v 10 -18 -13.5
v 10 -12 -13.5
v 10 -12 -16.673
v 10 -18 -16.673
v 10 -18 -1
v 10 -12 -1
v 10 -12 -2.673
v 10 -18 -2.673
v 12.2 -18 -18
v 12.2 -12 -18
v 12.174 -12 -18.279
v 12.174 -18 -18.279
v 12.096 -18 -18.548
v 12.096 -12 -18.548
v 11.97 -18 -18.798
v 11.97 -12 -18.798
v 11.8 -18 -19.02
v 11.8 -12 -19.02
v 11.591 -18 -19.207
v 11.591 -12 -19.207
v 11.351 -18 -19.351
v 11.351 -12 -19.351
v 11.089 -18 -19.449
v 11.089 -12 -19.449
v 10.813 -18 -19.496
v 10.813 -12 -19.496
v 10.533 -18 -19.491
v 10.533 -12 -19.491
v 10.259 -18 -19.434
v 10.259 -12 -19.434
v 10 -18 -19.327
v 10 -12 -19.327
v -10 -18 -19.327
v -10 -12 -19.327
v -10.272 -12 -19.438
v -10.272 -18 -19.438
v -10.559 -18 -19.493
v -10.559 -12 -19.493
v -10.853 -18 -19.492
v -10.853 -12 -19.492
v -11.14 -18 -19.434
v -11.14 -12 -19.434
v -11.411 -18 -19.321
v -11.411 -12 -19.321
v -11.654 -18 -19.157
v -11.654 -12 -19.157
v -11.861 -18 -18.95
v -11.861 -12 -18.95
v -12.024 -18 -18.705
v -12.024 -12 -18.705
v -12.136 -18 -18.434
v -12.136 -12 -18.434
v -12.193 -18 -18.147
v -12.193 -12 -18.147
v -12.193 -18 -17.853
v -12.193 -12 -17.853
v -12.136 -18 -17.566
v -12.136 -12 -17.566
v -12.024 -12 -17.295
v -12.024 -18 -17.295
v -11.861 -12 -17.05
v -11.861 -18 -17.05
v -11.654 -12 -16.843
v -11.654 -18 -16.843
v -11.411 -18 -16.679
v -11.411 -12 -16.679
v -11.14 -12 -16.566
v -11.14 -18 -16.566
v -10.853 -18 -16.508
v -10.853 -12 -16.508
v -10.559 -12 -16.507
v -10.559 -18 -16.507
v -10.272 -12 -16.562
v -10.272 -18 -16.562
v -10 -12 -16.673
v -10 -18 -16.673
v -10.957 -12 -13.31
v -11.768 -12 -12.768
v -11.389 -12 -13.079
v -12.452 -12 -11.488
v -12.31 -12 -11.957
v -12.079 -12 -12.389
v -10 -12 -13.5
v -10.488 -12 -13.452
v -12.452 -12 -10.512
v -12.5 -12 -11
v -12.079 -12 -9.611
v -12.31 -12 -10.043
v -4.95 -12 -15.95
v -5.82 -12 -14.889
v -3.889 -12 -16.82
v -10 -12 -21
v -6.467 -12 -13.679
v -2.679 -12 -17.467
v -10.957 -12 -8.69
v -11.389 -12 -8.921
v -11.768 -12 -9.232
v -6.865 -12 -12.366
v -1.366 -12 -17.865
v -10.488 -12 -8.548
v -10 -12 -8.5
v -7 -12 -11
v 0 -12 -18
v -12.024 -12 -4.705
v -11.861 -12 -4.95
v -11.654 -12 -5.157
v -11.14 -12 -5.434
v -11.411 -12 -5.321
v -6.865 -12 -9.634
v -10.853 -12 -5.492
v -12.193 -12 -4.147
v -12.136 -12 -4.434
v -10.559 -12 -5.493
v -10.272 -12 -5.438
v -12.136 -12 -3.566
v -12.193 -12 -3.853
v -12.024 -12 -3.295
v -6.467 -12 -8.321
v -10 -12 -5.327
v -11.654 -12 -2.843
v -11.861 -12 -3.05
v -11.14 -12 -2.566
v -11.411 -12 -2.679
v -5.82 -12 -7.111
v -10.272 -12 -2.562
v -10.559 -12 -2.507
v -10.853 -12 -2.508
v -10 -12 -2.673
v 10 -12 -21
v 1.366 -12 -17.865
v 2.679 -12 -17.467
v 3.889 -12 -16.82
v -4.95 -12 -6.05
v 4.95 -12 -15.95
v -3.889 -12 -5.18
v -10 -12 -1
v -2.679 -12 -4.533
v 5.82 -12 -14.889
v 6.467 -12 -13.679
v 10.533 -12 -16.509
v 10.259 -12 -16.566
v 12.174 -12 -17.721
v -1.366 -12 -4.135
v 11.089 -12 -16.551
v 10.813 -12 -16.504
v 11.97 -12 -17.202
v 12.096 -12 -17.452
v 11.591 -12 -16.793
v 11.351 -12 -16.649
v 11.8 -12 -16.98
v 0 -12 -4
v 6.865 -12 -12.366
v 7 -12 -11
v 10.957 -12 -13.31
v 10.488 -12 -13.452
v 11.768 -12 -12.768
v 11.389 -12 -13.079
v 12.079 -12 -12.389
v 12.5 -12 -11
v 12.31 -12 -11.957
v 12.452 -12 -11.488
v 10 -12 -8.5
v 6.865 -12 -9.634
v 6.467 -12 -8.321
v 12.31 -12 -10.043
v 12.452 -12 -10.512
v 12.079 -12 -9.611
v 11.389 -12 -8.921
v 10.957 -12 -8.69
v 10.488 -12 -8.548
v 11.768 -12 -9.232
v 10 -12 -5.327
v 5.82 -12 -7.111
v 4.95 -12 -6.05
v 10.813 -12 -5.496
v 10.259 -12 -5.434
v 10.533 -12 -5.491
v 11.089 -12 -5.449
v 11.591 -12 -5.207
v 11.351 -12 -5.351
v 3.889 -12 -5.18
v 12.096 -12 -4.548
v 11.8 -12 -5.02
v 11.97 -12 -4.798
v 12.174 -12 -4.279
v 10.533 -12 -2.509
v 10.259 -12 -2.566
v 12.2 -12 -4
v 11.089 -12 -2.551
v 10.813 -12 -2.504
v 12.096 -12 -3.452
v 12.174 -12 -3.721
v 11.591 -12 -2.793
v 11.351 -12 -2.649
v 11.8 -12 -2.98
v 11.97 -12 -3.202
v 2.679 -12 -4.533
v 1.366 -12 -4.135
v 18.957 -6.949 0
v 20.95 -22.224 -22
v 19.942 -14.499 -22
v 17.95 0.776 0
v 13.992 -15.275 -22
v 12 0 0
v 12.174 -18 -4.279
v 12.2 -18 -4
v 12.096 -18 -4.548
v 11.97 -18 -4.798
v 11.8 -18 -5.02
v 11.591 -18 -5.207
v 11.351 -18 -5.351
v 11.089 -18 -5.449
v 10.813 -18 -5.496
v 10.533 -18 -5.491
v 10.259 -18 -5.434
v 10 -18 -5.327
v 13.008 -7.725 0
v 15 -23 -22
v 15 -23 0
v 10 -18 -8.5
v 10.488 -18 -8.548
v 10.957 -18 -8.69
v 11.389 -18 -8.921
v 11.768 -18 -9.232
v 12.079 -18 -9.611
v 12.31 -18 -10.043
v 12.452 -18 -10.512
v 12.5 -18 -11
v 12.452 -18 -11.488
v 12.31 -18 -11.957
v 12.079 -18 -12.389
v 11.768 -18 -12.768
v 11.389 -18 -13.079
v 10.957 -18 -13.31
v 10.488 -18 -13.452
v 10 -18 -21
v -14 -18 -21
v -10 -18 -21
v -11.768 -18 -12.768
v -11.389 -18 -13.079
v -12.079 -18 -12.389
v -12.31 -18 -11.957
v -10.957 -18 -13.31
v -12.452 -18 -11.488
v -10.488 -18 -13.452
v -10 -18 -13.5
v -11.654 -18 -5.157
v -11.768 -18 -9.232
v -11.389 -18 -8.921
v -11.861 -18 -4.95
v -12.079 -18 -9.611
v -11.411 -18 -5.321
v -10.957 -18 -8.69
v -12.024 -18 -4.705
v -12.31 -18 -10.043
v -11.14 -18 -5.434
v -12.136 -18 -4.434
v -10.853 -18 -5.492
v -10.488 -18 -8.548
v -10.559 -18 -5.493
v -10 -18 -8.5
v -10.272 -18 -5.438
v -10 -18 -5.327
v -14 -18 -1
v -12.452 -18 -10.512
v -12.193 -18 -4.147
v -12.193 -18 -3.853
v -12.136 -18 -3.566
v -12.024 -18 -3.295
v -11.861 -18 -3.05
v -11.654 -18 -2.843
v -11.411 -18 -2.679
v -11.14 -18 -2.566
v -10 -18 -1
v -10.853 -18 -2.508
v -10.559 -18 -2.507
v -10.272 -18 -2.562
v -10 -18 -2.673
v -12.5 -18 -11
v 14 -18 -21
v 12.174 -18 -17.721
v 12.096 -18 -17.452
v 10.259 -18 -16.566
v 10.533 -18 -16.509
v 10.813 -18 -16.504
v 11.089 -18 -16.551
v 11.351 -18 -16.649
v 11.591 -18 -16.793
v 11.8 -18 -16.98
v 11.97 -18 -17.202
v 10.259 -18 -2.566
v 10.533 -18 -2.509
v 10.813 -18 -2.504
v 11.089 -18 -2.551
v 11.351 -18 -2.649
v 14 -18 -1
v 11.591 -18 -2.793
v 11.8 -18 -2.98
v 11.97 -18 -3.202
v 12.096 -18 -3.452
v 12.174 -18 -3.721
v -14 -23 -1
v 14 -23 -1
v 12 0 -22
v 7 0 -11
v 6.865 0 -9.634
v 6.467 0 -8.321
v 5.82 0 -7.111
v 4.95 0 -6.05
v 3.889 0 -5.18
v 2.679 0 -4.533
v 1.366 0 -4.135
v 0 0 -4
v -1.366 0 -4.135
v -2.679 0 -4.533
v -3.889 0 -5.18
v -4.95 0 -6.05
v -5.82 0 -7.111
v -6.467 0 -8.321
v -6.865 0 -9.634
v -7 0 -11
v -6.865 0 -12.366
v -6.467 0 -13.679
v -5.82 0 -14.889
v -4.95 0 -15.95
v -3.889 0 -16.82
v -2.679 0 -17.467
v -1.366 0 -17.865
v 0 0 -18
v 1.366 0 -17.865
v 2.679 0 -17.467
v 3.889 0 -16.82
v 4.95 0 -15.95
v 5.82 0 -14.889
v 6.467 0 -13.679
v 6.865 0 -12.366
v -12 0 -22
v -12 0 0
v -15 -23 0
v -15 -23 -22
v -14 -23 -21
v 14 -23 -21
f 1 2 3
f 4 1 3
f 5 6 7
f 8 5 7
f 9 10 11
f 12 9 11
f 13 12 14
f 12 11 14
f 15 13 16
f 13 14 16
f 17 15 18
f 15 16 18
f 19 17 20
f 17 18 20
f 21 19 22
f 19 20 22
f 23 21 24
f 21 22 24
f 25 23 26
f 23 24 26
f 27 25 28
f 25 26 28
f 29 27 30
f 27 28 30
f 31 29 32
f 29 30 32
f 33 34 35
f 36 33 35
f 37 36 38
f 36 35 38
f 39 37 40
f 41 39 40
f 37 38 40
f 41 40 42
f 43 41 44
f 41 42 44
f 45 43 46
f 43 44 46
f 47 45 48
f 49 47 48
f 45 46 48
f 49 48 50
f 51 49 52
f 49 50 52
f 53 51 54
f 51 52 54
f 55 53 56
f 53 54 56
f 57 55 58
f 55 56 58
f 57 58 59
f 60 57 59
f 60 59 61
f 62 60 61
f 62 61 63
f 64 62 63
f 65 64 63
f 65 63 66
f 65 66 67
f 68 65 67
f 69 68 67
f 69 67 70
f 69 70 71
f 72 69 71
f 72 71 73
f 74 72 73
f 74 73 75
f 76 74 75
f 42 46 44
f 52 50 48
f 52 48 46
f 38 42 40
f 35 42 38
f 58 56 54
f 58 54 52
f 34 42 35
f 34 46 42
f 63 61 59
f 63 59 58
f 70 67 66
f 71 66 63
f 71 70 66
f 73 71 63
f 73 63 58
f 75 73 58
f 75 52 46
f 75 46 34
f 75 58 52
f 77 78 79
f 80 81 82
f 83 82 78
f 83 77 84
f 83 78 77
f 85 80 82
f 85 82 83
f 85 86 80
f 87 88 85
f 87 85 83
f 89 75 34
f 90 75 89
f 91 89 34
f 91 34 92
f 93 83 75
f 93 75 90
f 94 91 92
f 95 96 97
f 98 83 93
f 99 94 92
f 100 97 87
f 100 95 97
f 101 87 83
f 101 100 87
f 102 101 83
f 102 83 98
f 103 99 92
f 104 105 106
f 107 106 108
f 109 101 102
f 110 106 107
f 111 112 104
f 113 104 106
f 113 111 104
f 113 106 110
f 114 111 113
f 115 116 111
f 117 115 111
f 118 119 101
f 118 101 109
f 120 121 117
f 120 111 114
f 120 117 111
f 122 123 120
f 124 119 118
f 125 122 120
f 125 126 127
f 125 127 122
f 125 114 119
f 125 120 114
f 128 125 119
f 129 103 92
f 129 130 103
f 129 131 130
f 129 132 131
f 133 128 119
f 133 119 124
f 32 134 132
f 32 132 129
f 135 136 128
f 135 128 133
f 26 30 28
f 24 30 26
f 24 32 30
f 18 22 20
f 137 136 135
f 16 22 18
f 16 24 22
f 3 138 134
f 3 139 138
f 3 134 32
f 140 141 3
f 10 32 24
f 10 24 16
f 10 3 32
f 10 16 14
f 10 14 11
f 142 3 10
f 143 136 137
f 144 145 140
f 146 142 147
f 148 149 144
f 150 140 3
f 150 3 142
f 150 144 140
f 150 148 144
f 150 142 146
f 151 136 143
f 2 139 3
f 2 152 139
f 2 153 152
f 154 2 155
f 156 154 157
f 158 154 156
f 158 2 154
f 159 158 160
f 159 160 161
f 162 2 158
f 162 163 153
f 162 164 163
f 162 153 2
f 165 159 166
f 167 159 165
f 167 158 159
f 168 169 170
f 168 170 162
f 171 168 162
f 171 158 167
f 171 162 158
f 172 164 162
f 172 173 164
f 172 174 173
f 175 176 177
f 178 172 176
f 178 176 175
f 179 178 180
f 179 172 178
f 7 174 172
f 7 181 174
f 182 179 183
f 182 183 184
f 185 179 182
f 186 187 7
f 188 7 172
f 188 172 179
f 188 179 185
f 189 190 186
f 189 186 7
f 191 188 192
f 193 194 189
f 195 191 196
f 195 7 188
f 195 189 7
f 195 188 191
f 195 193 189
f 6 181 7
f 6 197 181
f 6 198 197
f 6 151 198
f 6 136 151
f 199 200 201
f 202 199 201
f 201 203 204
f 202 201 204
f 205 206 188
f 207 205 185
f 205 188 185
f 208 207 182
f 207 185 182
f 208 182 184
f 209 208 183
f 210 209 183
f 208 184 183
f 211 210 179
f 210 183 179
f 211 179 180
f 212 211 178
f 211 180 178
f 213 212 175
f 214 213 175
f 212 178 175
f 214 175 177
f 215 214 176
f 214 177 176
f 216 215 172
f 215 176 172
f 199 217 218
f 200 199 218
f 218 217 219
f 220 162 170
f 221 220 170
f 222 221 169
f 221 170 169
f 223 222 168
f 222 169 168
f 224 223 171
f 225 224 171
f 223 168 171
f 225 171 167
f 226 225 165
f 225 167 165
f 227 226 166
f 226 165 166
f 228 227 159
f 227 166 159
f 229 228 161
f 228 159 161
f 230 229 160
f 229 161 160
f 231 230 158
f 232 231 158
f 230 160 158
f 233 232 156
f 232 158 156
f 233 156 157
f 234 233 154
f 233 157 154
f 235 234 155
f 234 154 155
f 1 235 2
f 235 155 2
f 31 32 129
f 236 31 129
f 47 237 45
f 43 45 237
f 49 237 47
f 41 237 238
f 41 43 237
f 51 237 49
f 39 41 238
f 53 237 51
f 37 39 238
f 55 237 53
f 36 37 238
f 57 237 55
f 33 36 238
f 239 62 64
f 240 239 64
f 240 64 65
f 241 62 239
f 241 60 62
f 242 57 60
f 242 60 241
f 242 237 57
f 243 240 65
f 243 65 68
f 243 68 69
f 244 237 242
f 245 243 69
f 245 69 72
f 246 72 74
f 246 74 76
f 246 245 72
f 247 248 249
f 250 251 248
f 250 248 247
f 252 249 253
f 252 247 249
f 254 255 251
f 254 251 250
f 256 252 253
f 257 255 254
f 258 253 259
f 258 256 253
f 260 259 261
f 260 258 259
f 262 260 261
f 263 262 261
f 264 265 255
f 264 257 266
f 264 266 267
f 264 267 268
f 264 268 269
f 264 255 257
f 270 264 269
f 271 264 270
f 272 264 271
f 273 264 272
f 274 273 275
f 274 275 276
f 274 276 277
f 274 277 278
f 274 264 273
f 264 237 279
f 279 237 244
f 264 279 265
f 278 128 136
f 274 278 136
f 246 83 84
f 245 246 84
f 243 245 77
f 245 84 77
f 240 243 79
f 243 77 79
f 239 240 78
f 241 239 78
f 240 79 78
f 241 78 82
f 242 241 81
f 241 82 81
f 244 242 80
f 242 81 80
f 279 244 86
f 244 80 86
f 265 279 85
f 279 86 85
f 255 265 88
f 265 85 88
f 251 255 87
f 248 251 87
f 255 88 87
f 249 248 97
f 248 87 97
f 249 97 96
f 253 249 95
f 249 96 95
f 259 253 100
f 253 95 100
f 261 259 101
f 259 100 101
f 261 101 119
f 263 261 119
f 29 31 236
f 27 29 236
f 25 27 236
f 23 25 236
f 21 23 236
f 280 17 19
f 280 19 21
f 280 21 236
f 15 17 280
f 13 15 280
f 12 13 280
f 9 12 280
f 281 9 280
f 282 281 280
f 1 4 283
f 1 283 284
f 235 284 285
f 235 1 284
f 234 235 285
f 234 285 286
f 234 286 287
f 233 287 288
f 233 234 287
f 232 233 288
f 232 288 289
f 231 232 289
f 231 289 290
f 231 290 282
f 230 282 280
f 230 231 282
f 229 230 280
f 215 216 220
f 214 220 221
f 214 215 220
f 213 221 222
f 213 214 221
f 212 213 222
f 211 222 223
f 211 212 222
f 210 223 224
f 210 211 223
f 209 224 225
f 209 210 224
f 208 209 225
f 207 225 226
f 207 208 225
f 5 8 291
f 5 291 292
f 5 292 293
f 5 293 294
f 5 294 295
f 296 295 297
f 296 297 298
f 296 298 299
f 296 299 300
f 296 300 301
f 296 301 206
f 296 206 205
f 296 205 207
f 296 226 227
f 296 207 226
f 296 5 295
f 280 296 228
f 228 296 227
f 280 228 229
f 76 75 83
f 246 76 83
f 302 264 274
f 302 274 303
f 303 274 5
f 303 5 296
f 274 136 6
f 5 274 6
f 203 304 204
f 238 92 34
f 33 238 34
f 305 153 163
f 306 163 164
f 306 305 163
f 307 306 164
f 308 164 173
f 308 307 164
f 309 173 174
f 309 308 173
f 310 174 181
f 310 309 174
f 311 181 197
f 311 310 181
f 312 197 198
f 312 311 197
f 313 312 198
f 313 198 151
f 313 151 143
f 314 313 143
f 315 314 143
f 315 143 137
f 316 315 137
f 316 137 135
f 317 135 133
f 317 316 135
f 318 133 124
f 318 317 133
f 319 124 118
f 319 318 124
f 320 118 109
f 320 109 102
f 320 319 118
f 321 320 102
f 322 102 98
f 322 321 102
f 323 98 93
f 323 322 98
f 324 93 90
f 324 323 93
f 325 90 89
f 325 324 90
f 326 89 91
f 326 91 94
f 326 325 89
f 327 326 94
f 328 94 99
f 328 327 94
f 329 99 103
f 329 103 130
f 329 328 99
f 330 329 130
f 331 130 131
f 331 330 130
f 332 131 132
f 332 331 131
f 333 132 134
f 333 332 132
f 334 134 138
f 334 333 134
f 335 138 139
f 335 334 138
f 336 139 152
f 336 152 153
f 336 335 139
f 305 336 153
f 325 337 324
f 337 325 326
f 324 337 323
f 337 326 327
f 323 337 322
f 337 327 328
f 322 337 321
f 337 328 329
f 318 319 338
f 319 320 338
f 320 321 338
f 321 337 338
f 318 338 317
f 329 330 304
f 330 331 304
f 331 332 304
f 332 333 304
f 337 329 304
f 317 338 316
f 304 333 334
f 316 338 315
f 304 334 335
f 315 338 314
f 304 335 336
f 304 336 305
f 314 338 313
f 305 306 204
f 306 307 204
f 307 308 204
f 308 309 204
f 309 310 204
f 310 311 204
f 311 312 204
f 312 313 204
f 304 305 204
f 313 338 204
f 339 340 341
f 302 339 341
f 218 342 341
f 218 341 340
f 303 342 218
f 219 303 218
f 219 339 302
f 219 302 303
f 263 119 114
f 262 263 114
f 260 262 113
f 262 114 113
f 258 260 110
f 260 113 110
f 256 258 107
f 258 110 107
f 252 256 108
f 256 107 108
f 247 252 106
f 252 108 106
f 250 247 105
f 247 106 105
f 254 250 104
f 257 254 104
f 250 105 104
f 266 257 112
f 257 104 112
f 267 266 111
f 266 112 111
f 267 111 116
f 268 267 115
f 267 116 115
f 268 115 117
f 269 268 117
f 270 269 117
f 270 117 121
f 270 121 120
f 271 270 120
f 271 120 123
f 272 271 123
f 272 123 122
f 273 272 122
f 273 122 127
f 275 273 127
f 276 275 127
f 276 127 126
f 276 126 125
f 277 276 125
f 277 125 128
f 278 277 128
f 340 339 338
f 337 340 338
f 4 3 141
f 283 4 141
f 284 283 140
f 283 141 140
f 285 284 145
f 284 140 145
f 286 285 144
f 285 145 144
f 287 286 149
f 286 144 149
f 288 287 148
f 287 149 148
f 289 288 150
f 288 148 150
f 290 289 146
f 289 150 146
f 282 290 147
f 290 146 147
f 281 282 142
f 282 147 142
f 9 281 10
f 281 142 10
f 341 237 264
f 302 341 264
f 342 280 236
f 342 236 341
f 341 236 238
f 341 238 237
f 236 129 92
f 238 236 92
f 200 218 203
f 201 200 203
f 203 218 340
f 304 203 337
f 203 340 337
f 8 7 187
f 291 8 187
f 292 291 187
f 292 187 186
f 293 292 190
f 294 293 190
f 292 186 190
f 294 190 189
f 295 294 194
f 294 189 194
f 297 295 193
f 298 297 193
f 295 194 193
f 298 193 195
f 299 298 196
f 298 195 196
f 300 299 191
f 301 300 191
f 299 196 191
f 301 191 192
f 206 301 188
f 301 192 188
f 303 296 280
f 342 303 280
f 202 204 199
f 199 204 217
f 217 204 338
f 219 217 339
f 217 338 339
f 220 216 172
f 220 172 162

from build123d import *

# Parameters (mm, degrees)
F0_W     = 30
F0_H     = 22
F1_DEPTH = 23
F2_DEPTH = 18
F0_R     = 7
F3_DEPTH = 12
F4_DEPTH = 12
F6_DEPTH = 25
F8_DEPTH = 6


with BuildPart() as f1:
    # F0 (on Front) → F1 (new body)
    with BuildSketch(Plane.XZ):
        with Locations((0, -11)):
            Rectangle(F0_W, F0_H)
        Polygon((-14, -21), (-14, -1), (-10, -1), (10, -1), (14, -1), (14, -21), (10, -21), (-10, -21), align=None, mode=Mode.SUBTRACT)
    extrude(amount=F1_DEPTH)

    # F0 (on Front) → F2 (join)
    with BuildSketch(Plane.XZ):
        with BuildLine():
            Line((-10, -1), (-14, -1))
            Line((-14, -1), (-14, -21))
            Line((-14, -21), (-10, -21))
            Line((-10, -21), (-10, -19.3266499161))
            ThreePointArc((-10, -19.3266499161), (-12.2, -18), (-10, -16.6733500839))
            Line((-10, -16.6733500839), (-10, -13.5))
            ThreePointArc((-10, -13.5), (-12.5, -11), (-10, -8.5))
            Line((-10, -8.5), (-10, -5.3266499161))
            ThreePointArc((-10, -5.3266499161), (-12.2, -4), (-10, -2.6733500839))
            Line((-10, -2.6733500839), (-10, -1))
        make_face()
        with BuildLine():
            Line((14, -1), (10, -1))
            Line((10, -1), (10, -2.6733500839))
            ThreePointArc((10, -2.6733500839), (11.4745966692, -2.7154767421), (12.2, -4))
            ThreePointArc((12.2, -4), (11.4745966692, -5.2845232579), (10, -5.3266499161))
            Line((10, -5.3266499161), (10, -8.5))
            ThreePointArc((10, -8.5), (12.5, -11), (10, -13.5))
            Line((10, -13.5), (10, -16.6733500839))
            ThreePointArc((10, -16.6733500839), (11.4745966692, -16.7154767421), (12.2, -18))
            ThreePointArc((12.2, -18), (11.4745966692, -19.2845232579), (10, -19.3266499161))
            Line((10, -19.3266499161), (10, -21))
            Line((10, -21), (14, -21))
            Line((14, -21), (14, -1))
        make_face()
    extrude(amount=F2_DEPTH)

    # F0 (on Front) → F3 (join)
    with BuildSketch(Plane.XZ):
        with BuildLine():
            Line((10, -1), (-10, -1))
            Line((-10, -1), (-10, -2.6733500839))
            ThreePointArc((-10, -2.6733500839), (-9.4154767421, -3.2254033308), (-9.2, -4))
            ThreePointArc((-9.2, -4), (-9.4154767421, -4.7745966692), (-10, -5.3266499161))
            Line((-10, -5.3266499161), (-10, -8.5))
            ThreePointArc((-10, -8.5), (-12.5, -11), (-10, -13.5))
            Line((-10, -13.5), (-10, -16.6733500839))
            ThreePointArc((-10, -16.6733500839), (-9.4154767421, -17.2254033308), (-9.2, -18))
            ThreePointArc((-9.2, -18), (-9.4154767421, -18.7745966692), (-10, -19.3266499161))
            Line((-10, -19.3266499161), (-10, -21))
            Line((-10, -21), (10, -21))
            Line((10, -21), (10, -19.3266499161))
            ThreePointArc((10, -19.3266499161), (9.2, -18), (10, -16.6733500839))
            Line((10, -16.6733500839), (10, -13.5))
            ThreePointArc((10, -13.5), (12.5, -11), (10, -8.5))
            Line((10, -8.5), (10, -5.3266499161))
            ThreePointArc((10, -5.3266499161), (9.2, -4), (10, -2.6733500839))
            Line((10, -2.6733500839), (10, -1))
        make_face()
        with Locations((0, -11)):
            Circle(F0_R, mode=Mode.SUBTRACT)
    extrude(amount=F3_DEPTH)

    # F0 (on Front) → F4 (join)
    with BuildSketch(Plane.XZ):
        with BuildLine():
            ThreePointArc((-9.2, -4), (-9.4154767421, -3.2254033308), (-10, -2.6733500839))
            ThreePointArc((-10, -2.6733500839), (-12.2, -4), (-10, -5.3266499161))
            ThreePointArc((-10, -5.3266499161), (-9.4154767421, -4.7745966692), (-9.2, -4))
        make_face()
        with BuildLine():
            ThreePointArc((12.2, -4), (11.4745966692, -2.7154767421), (10, -2.6733500839))
            ThreePointArc((10, -2.6733500839), (9.2, -4), (10, -5.3266499161))
            ThreePointArc((10, -5.3266499161), (11.4745966692, -5.2845232579), (12.2, -4))
        make_face()
        with BuildLine():
            ThreePointArc((10, -16.6733500839), (9.2, -18), (10, -19.3266499161))
            ThreePointArc((10, -19.3266499161), (11.4745966692, -19.2845232579), (12.2, -18))
            ThreePointArc((12.2, -18), (11.4745966692, -16.7154767421), (10, -16.6733500839))
        make_face()
        with BuildLine():
            ThreePointArc((-10, -16.6733500839), (-12.2, -18), (-10, -19.3266499161))
            ThreePointArc((-10, -19.3266499161), (-9.4154767421, -18.7745966692), (-9.2, -18))
            ThreePointArc((-9.2, -18), (-9.4154767421, -17.2254033308), (-10, -16.6733500839))
        make_face()
    extrude(amount=F4_DEPTH)

    # F5 (on face) → F6 (cut)
    with BuildSketch(Plane.XY):
        Polygon((-15, -23), (-12, 0), (-15, 0), align=None)
        Polygon((15, 0), (12, 0), (15, -23), align=None)
    extrude(amount=-F6_DEPTH, mode=Mode.SUBTRACT)

    # F7 (on face) → F8 (join)
    with BuildSketch(Plane(origin=(11.7992565056, 1.5390334572, 0), x_dir=(-0.1293391841, 0.9916004112, 0), z_dir=(0.9916004112, 0.1293391841, 0))):
        Polygon((-1.5520702088, 0), (-9.3423313777, 0), (-24.7468972183, -22), (-16.9566360494, -22), align=None)
    extrude(amount=F8_DEPTH)


solid = f1.part
